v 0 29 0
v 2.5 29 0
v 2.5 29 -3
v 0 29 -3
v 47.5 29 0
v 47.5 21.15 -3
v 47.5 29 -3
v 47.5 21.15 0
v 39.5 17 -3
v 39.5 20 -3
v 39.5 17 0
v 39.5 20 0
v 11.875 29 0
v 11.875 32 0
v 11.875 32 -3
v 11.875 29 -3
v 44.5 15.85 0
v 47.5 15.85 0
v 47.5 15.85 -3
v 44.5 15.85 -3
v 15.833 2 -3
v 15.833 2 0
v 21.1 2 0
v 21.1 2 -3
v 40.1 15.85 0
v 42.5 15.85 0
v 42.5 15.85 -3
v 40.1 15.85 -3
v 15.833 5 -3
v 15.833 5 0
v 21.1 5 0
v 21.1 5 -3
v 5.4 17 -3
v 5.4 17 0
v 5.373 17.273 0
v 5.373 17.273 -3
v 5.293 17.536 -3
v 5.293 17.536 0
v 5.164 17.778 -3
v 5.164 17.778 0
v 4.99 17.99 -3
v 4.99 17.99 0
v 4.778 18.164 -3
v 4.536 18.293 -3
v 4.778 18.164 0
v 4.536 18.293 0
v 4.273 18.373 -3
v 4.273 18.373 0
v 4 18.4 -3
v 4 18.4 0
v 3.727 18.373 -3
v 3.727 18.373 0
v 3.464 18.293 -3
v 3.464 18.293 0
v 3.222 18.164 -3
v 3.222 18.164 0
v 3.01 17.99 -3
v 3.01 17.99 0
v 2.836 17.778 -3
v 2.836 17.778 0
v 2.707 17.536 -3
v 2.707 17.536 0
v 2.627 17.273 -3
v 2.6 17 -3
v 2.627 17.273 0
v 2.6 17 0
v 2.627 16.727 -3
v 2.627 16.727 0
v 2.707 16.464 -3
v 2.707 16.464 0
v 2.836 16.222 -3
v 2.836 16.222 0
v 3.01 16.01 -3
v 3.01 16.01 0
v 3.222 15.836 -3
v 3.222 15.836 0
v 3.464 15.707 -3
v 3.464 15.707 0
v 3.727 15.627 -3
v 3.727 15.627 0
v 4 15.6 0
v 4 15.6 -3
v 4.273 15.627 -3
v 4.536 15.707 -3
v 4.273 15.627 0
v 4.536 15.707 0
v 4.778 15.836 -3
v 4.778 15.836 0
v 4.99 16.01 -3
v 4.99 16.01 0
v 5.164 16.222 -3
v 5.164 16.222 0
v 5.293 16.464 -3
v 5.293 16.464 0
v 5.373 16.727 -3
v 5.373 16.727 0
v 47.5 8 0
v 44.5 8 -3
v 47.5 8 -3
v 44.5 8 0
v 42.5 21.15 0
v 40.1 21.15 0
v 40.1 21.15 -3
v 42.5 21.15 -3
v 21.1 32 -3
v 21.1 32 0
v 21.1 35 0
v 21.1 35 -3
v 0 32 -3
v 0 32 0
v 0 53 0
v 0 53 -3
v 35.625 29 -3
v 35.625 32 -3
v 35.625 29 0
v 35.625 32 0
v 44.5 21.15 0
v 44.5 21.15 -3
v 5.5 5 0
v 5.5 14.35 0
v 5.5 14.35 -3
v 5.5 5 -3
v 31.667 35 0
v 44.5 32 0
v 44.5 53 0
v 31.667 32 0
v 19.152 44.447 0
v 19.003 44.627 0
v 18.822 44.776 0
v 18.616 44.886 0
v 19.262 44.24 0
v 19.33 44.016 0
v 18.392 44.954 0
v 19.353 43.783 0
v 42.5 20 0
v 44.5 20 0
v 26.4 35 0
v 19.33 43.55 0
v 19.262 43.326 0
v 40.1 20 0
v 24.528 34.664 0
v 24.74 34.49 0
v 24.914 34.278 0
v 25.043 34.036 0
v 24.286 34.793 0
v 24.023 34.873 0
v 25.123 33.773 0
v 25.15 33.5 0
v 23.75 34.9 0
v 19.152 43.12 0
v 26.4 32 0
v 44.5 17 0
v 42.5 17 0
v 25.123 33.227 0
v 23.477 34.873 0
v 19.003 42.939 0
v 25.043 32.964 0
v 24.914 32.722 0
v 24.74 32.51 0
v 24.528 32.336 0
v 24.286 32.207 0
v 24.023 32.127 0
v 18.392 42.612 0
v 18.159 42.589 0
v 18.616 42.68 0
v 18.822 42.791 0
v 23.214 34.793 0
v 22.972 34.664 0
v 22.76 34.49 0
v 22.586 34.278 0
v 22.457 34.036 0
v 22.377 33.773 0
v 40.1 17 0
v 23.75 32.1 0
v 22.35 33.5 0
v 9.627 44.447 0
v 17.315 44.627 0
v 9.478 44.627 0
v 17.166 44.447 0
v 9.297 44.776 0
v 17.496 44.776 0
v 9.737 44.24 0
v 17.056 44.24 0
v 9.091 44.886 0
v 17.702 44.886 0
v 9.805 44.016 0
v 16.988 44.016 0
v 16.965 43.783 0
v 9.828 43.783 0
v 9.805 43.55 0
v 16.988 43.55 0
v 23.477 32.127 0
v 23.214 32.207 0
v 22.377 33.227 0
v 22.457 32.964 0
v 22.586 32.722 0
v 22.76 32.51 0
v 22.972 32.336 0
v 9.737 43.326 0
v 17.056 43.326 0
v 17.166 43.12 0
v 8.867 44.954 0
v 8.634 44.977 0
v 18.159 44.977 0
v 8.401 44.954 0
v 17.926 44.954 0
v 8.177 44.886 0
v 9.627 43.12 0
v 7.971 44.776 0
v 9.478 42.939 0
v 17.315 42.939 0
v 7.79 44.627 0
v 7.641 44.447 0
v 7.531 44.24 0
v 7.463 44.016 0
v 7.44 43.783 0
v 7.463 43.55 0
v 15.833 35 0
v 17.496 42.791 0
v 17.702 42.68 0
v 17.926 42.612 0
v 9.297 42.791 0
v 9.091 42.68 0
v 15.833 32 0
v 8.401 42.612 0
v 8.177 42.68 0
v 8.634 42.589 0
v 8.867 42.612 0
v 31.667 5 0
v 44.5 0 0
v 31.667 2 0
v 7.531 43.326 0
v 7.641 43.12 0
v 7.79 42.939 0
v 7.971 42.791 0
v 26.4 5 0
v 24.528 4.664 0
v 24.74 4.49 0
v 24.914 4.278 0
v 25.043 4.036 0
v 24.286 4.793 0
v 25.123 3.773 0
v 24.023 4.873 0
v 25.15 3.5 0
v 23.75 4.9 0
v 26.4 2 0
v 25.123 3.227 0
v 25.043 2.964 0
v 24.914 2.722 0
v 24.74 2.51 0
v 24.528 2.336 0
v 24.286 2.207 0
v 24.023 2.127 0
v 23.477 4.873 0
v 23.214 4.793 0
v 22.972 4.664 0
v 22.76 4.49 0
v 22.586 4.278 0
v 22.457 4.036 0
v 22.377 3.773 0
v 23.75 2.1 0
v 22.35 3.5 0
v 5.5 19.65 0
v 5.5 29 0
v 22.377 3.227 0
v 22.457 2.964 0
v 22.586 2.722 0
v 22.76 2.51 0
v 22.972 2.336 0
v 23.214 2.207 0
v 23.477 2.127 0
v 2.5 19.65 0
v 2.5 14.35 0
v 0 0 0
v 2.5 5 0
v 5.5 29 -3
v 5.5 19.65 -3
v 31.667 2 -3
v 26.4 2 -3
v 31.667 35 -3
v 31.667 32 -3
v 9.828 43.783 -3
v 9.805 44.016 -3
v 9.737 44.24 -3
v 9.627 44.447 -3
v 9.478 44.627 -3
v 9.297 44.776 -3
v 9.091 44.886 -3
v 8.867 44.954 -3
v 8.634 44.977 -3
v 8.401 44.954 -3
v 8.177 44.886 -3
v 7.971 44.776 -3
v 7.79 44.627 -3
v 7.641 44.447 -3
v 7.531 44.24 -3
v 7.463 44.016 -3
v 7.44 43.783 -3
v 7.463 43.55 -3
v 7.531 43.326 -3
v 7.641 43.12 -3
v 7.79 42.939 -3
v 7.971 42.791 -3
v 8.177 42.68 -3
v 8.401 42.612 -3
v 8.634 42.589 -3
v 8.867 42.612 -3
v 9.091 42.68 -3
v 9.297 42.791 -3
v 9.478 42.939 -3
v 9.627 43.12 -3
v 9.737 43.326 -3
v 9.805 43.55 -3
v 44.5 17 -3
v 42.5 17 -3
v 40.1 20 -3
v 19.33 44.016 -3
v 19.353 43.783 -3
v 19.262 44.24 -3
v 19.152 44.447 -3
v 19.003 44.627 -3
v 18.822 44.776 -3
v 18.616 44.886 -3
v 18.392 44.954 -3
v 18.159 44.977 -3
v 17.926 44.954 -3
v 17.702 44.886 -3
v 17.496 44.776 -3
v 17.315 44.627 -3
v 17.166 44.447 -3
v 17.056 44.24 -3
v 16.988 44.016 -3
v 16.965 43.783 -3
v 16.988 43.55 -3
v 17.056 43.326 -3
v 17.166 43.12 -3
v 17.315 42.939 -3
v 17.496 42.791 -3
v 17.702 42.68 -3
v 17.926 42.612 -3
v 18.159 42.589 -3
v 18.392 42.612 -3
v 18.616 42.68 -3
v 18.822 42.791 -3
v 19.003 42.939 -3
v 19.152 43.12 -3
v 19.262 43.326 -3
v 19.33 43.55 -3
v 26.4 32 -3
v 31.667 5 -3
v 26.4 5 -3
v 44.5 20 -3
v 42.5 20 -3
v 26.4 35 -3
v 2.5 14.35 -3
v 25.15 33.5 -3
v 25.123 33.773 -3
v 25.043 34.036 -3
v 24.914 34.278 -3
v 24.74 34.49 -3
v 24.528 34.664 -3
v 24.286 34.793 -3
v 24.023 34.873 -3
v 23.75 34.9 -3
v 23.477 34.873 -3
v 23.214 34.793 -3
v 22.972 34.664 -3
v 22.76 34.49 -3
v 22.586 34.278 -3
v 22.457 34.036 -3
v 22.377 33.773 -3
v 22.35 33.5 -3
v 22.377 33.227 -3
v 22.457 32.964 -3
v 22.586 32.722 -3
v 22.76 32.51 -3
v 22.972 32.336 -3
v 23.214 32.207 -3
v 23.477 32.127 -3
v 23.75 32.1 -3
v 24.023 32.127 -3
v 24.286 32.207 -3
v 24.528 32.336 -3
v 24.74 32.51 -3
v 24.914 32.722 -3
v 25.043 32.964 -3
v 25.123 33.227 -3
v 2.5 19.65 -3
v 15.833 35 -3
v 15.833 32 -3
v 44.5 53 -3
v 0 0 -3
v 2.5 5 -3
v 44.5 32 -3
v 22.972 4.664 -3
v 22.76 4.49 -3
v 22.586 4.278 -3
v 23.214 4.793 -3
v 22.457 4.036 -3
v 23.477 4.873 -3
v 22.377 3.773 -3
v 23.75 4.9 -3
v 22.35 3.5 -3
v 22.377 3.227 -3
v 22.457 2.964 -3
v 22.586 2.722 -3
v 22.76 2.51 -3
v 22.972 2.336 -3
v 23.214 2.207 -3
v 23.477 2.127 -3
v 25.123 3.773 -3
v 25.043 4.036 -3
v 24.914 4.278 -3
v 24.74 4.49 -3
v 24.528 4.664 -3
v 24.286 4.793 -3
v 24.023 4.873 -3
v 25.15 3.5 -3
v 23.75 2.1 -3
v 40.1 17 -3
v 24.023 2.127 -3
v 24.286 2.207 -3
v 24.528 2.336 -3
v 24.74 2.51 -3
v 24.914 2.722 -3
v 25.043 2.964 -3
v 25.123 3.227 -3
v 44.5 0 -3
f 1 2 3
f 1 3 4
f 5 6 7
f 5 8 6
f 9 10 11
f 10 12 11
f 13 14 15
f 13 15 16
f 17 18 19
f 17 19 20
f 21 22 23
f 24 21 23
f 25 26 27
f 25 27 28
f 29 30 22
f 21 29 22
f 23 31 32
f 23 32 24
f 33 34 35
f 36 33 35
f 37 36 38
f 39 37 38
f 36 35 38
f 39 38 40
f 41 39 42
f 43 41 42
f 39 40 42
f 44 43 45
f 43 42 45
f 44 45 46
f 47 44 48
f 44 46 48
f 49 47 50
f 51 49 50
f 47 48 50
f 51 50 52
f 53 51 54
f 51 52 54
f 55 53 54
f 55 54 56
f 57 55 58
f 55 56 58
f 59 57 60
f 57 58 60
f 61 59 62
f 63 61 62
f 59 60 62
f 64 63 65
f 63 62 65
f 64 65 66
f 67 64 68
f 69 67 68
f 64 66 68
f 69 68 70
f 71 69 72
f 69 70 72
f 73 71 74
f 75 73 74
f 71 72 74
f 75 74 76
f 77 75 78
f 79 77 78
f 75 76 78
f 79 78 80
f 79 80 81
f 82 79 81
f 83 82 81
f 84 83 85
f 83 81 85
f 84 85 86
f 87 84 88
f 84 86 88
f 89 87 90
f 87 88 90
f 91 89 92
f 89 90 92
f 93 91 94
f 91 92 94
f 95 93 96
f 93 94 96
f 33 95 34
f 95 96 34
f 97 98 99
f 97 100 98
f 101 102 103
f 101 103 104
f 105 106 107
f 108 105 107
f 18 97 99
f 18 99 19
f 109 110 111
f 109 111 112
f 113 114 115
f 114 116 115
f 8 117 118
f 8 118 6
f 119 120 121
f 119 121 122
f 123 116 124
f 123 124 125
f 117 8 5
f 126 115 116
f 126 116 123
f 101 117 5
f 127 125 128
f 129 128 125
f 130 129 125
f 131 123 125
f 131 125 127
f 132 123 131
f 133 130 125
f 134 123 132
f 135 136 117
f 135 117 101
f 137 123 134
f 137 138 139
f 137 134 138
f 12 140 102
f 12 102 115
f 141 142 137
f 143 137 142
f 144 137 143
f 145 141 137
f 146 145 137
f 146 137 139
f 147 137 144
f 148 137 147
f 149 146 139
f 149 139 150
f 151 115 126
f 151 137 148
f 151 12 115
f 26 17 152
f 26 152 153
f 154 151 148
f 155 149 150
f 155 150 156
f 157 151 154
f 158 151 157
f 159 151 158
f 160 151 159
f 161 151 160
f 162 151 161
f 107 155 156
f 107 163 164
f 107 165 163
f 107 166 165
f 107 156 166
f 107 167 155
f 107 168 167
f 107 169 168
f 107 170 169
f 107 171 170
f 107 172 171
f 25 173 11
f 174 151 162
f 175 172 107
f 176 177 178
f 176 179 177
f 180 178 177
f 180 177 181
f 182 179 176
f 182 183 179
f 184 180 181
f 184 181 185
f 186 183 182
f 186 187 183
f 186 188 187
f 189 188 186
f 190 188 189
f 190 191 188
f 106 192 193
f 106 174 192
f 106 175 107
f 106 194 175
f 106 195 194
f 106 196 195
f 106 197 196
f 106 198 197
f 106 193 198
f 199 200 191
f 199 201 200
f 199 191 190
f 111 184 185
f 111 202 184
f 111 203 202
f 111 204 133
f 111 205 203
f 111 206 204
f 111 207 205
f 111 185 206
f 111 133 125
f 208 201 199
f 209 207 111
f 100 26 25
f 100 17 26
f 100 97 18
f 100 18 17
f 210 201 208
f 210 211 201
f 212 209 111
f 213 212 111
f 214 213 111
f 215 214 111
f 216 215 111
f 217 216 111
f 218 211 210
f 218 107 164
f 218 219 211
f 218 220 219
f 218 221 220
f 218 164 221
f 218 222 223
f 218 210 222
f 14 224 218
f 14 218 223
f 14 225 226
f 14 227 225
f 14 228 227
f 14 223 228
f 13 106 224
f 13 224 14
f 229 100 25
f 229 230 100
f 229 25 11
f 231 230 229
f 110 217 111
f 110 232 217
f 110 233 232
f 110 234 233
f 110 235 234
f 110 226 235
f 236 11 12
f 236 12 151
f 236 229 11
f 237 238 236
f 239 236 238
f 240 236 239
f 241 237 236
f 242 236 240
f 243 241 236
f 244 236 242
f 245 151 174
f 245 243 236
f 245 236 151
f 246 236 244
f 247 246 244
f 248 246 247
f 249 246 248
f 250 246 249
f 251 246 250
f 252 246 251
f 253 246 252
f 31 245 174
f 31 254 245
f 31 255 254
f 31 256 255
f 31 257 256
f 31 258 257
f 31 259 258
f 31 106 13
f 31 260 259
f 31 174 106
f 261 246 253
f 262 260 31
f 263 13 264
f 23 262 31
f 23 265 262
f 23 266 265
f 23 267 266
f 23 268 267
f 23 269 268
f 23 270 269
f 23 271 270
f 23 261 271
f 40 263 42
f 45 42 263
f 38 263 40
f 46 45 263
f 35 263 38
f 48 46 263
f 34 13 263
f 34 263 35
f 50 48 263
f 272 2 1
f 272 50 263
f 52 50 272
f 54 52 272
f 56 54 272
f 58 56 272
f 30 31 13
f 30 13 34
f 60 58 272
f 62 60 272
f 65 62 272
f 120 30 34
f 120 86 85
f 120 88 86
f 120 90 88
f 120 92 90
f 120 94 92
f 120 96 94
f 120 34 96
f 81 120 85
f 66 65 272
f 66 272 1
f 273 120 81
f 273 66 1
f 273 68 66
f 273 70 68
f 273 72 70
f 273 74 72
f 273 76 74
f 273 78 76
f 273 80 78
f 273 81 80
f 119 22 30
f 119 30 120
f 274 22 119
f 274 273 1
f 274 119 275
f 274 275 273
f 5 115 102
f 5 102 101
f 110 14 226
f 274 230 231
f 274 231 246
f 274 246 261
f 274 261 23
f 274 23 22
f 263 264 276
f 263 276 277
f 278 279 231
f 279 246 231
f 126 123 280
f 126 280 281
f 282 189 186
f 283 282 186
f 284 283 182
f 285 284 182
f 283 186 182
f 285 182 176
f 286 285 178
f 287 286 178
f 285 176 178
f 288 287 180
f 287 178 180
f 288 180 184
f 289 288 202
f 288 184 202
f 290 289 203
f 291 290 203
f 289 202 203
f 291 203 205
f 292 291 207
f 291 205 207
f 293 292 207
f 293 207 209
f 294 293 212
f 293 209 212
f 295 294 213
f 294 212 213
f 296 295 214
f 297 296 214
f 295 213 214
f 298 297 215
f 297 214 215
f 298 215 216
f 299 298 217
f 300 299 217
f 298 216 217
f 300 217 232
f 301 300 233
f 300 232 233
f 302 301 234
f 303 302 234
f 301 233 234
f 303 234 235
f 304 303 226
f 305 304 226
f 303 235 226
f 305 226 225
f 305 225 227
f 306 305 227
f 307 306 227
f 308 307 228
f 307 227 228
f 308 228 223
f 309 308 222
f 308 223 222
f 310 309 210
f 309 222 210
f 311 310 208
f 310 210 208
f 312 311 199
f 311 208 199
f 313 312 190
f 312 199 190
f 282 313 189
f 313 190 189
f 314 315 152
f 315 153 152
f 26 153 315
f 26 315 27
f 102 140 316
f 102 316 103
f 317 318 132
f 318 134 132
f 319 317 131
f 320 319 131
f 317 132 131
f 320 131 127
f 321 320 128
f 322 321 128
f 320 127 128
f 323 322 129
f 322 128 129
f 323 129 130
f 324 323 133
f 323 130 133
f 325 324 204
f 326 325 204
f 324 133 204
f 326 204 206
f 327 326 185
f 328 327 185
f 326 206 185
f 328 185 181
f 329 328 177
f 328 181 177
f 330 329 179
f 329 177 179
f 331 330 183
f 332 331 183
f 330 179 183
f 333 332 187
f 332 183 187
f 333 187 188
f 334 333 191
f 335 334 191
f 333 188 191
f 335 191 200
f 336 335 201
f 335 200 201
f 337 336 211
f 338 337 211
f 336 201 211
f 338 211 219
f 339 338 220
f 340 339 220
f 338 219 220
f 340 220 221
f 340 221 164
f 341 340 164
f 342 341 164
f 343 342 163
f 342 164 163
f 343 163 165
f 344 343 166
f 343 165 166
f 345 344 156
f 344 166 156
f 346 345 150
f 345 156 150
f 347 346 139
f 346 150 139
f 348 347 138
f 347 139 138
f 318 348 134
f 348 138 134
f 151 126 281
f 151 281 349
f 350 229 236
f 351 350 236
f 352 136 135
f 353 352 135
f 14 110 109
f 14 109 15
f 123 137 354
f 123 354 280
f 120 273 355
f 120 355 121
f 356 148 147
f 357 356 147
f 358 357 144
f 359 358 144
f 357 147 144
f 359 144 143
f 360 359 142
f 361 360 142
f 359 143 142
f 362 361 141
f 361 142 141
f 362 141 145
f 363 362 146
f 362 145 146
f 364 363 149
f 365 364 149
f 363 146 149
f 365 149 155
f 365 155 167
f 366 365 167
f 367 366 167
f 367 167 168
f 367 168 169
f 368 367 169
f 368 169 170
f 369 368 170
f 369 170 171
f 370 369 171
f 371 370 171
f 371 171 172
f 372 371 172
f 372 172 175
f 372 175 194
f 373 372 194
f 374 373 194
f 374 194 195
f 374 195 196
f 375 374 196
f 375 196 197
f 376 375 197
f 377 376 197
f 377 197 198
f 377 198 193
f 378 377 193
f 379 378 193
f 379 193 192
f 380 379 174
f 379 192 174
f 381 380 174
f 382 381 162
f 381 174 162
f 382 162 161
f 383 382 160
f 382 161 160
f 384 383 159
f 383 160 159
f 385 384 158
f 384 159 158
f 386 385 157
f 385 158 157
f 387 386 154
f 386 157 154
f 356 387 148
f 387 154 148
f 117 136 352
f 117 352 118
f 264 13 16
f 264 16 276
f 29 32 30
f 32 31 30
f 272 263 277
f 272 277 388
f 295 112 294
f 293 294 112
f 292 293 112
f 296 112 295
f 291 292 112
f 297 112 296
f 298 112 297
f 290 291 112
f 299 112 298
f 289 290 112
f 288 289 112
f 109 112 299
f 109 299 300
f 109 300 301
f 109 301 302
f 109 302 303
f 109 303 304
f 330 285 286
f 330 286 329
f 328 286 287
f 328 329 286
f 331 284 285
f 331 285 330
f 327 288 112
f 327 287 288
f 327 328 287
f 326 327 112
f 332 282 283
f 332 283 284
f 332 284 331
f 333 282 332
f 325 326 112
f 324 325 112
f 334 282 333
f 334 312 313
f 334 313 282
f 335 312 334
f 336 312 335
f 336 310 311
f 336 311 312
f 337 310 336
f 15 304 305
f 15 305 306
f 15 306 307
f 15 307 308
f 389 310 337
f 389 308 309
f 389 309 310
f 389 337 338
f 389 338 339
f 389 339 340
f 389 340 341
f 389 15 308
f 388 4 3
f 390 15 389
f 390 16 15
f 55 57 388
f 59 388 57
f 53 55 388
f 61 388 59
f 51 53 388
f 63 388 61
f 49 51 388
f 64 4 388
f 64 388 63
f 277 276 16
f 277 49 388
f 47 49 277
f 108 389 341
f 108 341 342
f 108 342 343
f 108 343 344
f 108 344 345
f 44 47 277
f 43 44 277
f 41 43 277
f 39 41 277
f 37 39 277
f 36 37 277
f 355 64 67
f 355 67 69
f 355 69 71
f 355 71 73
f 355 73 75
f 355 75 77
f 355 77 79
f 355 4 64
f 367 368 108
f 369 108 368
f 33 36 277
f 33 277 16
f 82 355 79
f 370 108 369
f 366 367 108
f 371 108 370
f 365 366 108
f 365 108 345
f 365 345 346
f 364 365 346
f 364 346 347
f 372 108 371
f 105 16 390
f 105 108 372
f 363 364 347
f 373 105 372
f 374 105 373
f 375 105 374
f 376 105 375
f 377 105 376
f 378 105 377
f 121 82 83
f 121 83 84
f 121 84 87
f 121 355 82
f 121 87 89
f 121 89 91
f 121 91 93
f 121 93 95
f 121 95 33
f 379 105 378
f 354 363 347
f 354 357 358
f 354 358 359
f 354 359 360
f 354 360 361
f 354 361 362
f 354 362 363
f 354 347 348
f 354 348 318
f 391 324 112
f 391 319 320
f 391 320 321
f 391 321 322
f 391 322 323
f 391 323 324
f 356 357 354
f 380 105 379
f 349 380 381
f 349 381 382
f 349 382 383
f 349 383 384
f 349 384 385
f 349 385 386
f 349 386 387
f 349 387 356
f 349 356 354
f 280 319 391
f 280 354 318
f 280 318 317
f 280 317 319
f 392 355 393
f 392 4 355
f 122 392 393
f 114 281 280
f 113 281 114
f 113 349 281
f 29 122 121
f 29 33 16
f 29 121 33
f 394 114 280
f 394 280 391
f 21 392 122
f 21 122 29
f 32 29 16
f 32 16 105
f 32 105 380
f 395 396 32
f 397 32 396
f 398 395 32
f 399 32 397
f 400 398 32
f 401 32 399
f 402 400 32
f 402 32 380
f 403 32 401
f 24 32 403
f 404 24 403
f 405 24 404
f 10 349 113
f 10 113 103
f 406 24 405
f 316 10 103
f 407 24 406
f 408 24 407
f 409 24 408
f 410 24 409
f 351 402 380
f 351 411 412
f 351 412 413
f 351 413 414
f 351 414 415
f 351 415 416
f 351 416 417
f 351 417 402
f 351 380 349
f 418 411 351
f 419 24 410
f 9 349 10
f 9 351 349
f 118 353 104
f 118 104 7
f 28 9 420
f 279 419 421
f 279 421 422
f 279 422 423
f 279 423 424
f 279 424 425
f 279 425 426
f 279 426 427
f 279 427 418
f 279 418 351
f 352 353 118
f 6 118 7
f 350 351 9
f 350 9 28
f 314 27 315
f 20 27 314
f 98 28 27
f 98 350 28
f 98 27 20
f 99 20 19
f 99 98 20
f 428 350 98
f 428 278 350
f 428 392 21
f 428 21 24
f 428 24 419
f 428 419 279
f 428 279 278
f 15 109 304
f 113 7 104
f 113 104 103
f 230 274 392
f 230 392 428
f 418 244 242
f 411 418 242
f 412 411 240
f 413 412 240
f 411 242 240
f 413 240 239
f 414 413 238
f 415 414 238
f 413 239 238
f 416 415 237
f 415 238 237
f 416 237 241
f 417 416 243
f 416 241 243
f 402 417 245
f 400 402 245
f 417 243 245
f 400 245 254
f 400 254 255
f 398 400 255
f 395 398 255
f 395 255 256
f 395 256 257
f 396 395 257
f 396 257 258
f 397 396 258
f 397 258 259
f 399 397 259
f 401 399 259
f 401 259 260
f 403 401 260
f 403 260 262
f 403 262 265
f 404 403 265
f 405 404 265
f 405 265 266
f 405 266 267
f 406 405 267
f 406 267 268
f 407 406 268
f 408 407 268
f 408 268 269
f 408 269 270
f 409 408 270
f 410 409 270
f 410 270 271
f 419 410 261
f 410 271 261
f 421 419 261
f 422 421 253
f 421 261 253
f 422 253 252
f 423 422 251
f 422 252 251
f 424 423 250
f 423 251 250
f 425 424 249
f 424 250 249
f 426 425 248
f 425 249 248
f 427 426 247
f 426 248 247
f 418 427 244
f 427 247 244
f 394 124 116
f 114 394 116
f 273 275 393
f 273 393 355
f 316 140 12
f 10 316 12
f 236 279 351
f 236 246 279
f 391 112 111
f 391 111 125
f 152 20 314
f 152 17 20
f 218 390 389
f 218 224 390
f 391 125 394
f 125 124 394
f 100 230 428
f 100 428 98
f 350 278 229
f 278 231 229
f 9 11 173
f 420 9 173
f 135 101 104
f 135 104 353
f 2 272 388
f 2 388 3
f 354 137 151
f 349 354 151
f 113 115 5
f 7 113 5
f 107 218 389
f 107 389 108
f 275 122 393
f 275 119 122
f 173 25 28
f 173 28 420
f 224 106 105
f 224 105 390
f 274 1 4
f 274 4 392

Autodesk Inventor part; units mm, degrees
ref_plane "YZ Plane" through (0, 0, 0) normal (1, 0, 0) x (0, 1, 0)
ref_plane "XZ Plane" through (0, 0, 0) normal (0, 1, 0) x (-1, 0, 0)
ref_plane "XY Plane" through (0, 0, 0) normal (0, 0, 1) x (1, 0, 0)
sketch "Sketch1" plane through (0, 0, 0) normal (0, 0, 1) x (1, 0, 0)
  line L0 (0, 0) -> (47.5, 0)
  line L1 (47.5, 0) -> (47.5, 37)
  line L2 (47.5, 37) -> (0, 37)
  line L3 (0, 37) -> (0, 0)
  dimension "d60" = 47.5
  dimension "d61" = 37
extrude "Extrusion1" add sketch "Sketch1" against normal blind 3
sketch "Sketch6" plane through (0, 0, 0) normal (0, 0, 1) x (1, 0, 0)
  line L0 (47.5, 0) -> (47.5, 37) projected
  line L1 (47.5, 37) -> (0, 37) projected
  line L2 (0, 37) -> (47.5, 37) projected
  line L3 (47.5, 37) -> (44.5, 37)
  line L4 (44.5, 37) -> (44.5, 29)
  line L5 (44.5, 29) -> (47.5, 29)
  line L6 (47.5, 29) -> (47.5, 37)
  line L7 (44.5, 0) -> (44.5, 8)
  line L8 (44.5, 8) -> (47.5, 8)
  line L9 (47.5, 8) -> (47.5, 0)
  line L10 (47.5, 0) -> (44.5, 0)
  line L11 (-10.772, 18.5) -> (61.9279, 18.5) construction
  line L12 (23.75, 42.476) -> (23.75, -8.8223) construction
  line L13 (47.5, 20) -> (39.5, 20)
  line L14 (39.5, 20) -> (39.5, 17)
  line L15 (39.5, 17) -> (47.5, 17)
  line L16 (47.5, 17) -> (47.5, 20)
  line L17 (47.5, 37) -> (47.5, 0) projected
  line L18 (44.5, 21.15) -> (47.5, 21.15)
  line L19 (47.5, 21.15) -> (47.5, 15.85)
  line L20 (47.5, 15.85) -> (44.5, 15.85)
  line L21 (44.5, 15.85) -> (44.5, 21.15)
  line L22 (40.1, 21.15) -> (42.5, 21.15)
  line L23 (42.5, 21.15) -> (42.5, 15.85)
  line L24 (42.5, 15.85) -> (40.1, 15.85)
  line L25 (40.1, 15.85) -> (40.1, 21.15)
  line L26 (15.8333, 35) -> (21.1, 35)
  line L27 (31.6667, 35) -> (31.6667, 32)
  line L28 (31.6667, 32) -> (26.4, 32)
  line L29 (15.8333, 32) -> (15.8333, 35)
  line L30 (26.4, 35) -> (26.4, 32)
  line L31 (21.1, 32) -> (21.1, 35)
  line L32 (26.4, 35) -> (31.6667, 35)
  line L33 (21.1, 32) -> (15.8333, 32)
  circle A0 centre (23.75, 33.5) radius 1.4
  line L34 (0, 0) -> (47.5, 0) projected
  line L35 (0, 0) -> (0, 37) projected
  line L36 (0, 32) -> (11.875, 32)
  line L37 (11.875, 32) -> (11.875, 29)
  line L38 (11.875, 29) -> (0, 29)
  line L39 (0, 29) -> (0, 32)
  line L40 (44.5, 32) -> (35.625, 32)
  line L41 (35.625, 32) -> (35.625, 29)
  line L42 (35.625, 29) -> (44.5, 29)
  line L43 (44.5, 29) -> (44.5, 32)
  line L44 (15.8333, 2) -> (21.1, 2)
  line L45 (31.6667, 2) -> (31.6667, 5)
  line L46 (31.6667, 5) -> (26.4, 5)
  line L47 (15.8333, 5) -> (15.8333, 2)
  line L48 (26.4, 2) -> (26.4, 5)
  line L49 (21.1, 5) -> (21.1, 2)
  line L50 (26.4, 2) -> (31.6667, 2)
  line L51 (21.1, 5) -> (15.8333, 5)
  circle A1 centre (23.75, 3.5) radius 1.4
  line L52 (5.5, 19.65) -> (2.5, 19.65)
  line L53 (2.5, 19.65) -> (2.5, 29)
  line L54 (2.5, 29) -> (5.5, 29)
  line L55 (5.5, 29) -> (5.5, 19.65)
  line L56 (2.5, 14.35) -> (5.5, 14.35)
  line L57 (5.5, 14.35) -> (5.5, 5)
  line L58 (5.5, 5) -> (2.5, 5)
  line L59 (2.5, 5) -> (2.5, 14.35)
  circle A2 centre (4, 17) radius 1.4
  dimension "d65" = 3
  dimension "d75" = 8
  dimension "d76" = 3
  dimension "d78" = 5.3
  dimension "d80" = 5
  dimension "d81" = 2.4
  dimension "d83" = 3
  dimension "d84" = 15.8333
  dimension "d85" = 2
  dimension "d86" = 5.3
  dimension "d87" = 2.8
  dimension "d88" = 3
  dimension "d89" = 23.75
  dimension "d90" = 47.5
  dimension "d91" = 2.8
  dimension "d92" = 5.3
  dimension "d93" = 2.65
  dimension "d94" = 1.5
extrude "Extrusion6" cut sketch "Sketch6" against normal blind 3 contours L10 L7 L8 L0 | L20 L21 L15 L0 | L15 L21 L13 L0 | L35 L36 L37 L38 | L13 L21 L18 L0 | L15 L23 L13 L21 | L38 L55 L52 L53 | L23 L24 L25 L15 | L15 L25 L13 L23 | L5 L4 L1 L0 | L13 L25 L22 L23 | L15 L14 L13 L25 | L42 L41 L40 L4 | L26 L31 L33 L29 | L27 L28 L30 L32 | A0 | L47 L51 L49 L44 | L50 L48 L46 L45 | A1 | L56 L57 L58 L59 | A2
sketch "Sketch9" plane through (0, 37, 0) normal (0, 1, 0) x (1, 0, 0)
  line L0 (44.5, 0) -> (44.5, 3) projected
  line L1 (0, 3) -> (44.5, 3) projected
  line L2 (0, 0) -> (0, 3) projected
  line L3 (44.5, 0) -> (0, 0) projected
  point P0 (0, 0)
extrude "Extrusion8" add sketch "Sketch9" along normal blind 16
sketch "Sketch10" plane through (0, 0, 0) normal (0, 0, 1) x (1, 0, 0)
  circle A0 centre (8.6339, 43.7833) radius 1.1938
  circle A1 centre (18.1589, 43.7833) radius 1.1938
  line L0 (0, 53) -> (44.5, 53) projected
  point P0 (0, 0)
  dimension "d99" = 2.3876
  dimension "d100" = 2.3876
  dimension "d101" = 9.2167
  dimension "d102" = 9.2167
extrude "Extrusion9" cut sketch "Sketch10" against normal up to next
equation "\"d89\" = 0.5 * d90"
equation "\"d93\" = 0.5 * d92"
equation "\"d102\" = d101"
equation "\"d15\" = 0.333333 * d14"
equation "\"d14\" = 30"
properties part number "X-Anchor_Side"
